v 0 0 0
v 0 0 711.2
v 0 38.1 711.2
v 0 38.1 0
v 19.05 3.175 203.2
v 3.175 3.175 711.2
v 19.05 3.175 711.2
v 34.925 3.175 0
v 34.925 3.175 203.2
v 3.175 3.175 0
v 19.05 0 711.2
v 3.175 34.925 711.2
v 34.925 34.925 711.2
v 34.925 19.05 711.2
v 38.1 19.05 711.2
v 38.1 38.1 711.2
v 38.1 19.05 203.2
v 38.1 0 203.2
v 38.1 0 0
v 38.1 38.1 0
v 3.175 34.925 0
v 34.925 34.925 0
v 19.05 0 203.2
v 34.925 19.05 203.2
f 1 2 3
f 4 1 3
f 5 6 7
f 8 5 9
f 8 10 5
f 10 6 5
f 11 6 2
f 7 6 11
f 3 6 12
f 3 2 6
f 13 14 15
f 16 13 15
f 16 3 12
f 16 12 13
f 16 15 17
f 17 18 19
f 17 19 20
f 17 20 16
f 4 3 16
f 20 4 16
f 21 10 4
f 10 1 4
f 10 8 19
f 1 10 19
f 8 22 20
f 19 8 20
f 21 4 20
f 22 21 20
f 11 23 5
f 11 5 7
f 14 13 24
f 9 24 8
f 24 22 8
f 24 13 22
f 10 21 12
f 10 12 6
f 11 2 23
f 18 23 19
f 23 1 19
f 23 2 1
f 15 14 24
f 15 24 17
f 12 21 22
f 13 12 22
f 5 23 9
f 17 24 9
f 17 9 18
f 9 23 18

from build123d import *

# Parameters (mm, degrees)
F0_W     = 38.1
F0_H     = 38.1
F1_DEPTH = 711.2
F2_W     = 19.05
F2_H     = 508
F3_DEPTH = 19.05
F4_W     = 31.75
F4_H     = 31.75
F5_DEPTH = 711.201


with BuildPart() as f1:
    # F0 (on Top) → F1 (new body)
    with BuildSketch(Plane.XY):
        with Locations((19.05, 19.05)):
            Rectangle(F0_W, F0_H)
    extrude(amount=F1_DEPTH)

    # F2 (on face) → F3 (cut)
    with BuildSketch(Plane.XZ):
        with Locations((28.575, 457.2)):
            Rectangle(F2_W, F2_H)
    extrude(amount=-F3_DEPTH, mode=Mode.SUBTRACT)

    # F4 (on face) → F5 (cut, through all)
    with BuildSketch(Plane(origin=(0, 0, 0), x_dir=(1, 0, 0), z_dir=(0, 0, -1))):
        with Locations((19.05, -19.05)):
            Rectangle(F4_W, F4_H)
    extrude(amount=-F5_DEPTH, mode=Mode.SUBTRACT)


solid = f1.part
